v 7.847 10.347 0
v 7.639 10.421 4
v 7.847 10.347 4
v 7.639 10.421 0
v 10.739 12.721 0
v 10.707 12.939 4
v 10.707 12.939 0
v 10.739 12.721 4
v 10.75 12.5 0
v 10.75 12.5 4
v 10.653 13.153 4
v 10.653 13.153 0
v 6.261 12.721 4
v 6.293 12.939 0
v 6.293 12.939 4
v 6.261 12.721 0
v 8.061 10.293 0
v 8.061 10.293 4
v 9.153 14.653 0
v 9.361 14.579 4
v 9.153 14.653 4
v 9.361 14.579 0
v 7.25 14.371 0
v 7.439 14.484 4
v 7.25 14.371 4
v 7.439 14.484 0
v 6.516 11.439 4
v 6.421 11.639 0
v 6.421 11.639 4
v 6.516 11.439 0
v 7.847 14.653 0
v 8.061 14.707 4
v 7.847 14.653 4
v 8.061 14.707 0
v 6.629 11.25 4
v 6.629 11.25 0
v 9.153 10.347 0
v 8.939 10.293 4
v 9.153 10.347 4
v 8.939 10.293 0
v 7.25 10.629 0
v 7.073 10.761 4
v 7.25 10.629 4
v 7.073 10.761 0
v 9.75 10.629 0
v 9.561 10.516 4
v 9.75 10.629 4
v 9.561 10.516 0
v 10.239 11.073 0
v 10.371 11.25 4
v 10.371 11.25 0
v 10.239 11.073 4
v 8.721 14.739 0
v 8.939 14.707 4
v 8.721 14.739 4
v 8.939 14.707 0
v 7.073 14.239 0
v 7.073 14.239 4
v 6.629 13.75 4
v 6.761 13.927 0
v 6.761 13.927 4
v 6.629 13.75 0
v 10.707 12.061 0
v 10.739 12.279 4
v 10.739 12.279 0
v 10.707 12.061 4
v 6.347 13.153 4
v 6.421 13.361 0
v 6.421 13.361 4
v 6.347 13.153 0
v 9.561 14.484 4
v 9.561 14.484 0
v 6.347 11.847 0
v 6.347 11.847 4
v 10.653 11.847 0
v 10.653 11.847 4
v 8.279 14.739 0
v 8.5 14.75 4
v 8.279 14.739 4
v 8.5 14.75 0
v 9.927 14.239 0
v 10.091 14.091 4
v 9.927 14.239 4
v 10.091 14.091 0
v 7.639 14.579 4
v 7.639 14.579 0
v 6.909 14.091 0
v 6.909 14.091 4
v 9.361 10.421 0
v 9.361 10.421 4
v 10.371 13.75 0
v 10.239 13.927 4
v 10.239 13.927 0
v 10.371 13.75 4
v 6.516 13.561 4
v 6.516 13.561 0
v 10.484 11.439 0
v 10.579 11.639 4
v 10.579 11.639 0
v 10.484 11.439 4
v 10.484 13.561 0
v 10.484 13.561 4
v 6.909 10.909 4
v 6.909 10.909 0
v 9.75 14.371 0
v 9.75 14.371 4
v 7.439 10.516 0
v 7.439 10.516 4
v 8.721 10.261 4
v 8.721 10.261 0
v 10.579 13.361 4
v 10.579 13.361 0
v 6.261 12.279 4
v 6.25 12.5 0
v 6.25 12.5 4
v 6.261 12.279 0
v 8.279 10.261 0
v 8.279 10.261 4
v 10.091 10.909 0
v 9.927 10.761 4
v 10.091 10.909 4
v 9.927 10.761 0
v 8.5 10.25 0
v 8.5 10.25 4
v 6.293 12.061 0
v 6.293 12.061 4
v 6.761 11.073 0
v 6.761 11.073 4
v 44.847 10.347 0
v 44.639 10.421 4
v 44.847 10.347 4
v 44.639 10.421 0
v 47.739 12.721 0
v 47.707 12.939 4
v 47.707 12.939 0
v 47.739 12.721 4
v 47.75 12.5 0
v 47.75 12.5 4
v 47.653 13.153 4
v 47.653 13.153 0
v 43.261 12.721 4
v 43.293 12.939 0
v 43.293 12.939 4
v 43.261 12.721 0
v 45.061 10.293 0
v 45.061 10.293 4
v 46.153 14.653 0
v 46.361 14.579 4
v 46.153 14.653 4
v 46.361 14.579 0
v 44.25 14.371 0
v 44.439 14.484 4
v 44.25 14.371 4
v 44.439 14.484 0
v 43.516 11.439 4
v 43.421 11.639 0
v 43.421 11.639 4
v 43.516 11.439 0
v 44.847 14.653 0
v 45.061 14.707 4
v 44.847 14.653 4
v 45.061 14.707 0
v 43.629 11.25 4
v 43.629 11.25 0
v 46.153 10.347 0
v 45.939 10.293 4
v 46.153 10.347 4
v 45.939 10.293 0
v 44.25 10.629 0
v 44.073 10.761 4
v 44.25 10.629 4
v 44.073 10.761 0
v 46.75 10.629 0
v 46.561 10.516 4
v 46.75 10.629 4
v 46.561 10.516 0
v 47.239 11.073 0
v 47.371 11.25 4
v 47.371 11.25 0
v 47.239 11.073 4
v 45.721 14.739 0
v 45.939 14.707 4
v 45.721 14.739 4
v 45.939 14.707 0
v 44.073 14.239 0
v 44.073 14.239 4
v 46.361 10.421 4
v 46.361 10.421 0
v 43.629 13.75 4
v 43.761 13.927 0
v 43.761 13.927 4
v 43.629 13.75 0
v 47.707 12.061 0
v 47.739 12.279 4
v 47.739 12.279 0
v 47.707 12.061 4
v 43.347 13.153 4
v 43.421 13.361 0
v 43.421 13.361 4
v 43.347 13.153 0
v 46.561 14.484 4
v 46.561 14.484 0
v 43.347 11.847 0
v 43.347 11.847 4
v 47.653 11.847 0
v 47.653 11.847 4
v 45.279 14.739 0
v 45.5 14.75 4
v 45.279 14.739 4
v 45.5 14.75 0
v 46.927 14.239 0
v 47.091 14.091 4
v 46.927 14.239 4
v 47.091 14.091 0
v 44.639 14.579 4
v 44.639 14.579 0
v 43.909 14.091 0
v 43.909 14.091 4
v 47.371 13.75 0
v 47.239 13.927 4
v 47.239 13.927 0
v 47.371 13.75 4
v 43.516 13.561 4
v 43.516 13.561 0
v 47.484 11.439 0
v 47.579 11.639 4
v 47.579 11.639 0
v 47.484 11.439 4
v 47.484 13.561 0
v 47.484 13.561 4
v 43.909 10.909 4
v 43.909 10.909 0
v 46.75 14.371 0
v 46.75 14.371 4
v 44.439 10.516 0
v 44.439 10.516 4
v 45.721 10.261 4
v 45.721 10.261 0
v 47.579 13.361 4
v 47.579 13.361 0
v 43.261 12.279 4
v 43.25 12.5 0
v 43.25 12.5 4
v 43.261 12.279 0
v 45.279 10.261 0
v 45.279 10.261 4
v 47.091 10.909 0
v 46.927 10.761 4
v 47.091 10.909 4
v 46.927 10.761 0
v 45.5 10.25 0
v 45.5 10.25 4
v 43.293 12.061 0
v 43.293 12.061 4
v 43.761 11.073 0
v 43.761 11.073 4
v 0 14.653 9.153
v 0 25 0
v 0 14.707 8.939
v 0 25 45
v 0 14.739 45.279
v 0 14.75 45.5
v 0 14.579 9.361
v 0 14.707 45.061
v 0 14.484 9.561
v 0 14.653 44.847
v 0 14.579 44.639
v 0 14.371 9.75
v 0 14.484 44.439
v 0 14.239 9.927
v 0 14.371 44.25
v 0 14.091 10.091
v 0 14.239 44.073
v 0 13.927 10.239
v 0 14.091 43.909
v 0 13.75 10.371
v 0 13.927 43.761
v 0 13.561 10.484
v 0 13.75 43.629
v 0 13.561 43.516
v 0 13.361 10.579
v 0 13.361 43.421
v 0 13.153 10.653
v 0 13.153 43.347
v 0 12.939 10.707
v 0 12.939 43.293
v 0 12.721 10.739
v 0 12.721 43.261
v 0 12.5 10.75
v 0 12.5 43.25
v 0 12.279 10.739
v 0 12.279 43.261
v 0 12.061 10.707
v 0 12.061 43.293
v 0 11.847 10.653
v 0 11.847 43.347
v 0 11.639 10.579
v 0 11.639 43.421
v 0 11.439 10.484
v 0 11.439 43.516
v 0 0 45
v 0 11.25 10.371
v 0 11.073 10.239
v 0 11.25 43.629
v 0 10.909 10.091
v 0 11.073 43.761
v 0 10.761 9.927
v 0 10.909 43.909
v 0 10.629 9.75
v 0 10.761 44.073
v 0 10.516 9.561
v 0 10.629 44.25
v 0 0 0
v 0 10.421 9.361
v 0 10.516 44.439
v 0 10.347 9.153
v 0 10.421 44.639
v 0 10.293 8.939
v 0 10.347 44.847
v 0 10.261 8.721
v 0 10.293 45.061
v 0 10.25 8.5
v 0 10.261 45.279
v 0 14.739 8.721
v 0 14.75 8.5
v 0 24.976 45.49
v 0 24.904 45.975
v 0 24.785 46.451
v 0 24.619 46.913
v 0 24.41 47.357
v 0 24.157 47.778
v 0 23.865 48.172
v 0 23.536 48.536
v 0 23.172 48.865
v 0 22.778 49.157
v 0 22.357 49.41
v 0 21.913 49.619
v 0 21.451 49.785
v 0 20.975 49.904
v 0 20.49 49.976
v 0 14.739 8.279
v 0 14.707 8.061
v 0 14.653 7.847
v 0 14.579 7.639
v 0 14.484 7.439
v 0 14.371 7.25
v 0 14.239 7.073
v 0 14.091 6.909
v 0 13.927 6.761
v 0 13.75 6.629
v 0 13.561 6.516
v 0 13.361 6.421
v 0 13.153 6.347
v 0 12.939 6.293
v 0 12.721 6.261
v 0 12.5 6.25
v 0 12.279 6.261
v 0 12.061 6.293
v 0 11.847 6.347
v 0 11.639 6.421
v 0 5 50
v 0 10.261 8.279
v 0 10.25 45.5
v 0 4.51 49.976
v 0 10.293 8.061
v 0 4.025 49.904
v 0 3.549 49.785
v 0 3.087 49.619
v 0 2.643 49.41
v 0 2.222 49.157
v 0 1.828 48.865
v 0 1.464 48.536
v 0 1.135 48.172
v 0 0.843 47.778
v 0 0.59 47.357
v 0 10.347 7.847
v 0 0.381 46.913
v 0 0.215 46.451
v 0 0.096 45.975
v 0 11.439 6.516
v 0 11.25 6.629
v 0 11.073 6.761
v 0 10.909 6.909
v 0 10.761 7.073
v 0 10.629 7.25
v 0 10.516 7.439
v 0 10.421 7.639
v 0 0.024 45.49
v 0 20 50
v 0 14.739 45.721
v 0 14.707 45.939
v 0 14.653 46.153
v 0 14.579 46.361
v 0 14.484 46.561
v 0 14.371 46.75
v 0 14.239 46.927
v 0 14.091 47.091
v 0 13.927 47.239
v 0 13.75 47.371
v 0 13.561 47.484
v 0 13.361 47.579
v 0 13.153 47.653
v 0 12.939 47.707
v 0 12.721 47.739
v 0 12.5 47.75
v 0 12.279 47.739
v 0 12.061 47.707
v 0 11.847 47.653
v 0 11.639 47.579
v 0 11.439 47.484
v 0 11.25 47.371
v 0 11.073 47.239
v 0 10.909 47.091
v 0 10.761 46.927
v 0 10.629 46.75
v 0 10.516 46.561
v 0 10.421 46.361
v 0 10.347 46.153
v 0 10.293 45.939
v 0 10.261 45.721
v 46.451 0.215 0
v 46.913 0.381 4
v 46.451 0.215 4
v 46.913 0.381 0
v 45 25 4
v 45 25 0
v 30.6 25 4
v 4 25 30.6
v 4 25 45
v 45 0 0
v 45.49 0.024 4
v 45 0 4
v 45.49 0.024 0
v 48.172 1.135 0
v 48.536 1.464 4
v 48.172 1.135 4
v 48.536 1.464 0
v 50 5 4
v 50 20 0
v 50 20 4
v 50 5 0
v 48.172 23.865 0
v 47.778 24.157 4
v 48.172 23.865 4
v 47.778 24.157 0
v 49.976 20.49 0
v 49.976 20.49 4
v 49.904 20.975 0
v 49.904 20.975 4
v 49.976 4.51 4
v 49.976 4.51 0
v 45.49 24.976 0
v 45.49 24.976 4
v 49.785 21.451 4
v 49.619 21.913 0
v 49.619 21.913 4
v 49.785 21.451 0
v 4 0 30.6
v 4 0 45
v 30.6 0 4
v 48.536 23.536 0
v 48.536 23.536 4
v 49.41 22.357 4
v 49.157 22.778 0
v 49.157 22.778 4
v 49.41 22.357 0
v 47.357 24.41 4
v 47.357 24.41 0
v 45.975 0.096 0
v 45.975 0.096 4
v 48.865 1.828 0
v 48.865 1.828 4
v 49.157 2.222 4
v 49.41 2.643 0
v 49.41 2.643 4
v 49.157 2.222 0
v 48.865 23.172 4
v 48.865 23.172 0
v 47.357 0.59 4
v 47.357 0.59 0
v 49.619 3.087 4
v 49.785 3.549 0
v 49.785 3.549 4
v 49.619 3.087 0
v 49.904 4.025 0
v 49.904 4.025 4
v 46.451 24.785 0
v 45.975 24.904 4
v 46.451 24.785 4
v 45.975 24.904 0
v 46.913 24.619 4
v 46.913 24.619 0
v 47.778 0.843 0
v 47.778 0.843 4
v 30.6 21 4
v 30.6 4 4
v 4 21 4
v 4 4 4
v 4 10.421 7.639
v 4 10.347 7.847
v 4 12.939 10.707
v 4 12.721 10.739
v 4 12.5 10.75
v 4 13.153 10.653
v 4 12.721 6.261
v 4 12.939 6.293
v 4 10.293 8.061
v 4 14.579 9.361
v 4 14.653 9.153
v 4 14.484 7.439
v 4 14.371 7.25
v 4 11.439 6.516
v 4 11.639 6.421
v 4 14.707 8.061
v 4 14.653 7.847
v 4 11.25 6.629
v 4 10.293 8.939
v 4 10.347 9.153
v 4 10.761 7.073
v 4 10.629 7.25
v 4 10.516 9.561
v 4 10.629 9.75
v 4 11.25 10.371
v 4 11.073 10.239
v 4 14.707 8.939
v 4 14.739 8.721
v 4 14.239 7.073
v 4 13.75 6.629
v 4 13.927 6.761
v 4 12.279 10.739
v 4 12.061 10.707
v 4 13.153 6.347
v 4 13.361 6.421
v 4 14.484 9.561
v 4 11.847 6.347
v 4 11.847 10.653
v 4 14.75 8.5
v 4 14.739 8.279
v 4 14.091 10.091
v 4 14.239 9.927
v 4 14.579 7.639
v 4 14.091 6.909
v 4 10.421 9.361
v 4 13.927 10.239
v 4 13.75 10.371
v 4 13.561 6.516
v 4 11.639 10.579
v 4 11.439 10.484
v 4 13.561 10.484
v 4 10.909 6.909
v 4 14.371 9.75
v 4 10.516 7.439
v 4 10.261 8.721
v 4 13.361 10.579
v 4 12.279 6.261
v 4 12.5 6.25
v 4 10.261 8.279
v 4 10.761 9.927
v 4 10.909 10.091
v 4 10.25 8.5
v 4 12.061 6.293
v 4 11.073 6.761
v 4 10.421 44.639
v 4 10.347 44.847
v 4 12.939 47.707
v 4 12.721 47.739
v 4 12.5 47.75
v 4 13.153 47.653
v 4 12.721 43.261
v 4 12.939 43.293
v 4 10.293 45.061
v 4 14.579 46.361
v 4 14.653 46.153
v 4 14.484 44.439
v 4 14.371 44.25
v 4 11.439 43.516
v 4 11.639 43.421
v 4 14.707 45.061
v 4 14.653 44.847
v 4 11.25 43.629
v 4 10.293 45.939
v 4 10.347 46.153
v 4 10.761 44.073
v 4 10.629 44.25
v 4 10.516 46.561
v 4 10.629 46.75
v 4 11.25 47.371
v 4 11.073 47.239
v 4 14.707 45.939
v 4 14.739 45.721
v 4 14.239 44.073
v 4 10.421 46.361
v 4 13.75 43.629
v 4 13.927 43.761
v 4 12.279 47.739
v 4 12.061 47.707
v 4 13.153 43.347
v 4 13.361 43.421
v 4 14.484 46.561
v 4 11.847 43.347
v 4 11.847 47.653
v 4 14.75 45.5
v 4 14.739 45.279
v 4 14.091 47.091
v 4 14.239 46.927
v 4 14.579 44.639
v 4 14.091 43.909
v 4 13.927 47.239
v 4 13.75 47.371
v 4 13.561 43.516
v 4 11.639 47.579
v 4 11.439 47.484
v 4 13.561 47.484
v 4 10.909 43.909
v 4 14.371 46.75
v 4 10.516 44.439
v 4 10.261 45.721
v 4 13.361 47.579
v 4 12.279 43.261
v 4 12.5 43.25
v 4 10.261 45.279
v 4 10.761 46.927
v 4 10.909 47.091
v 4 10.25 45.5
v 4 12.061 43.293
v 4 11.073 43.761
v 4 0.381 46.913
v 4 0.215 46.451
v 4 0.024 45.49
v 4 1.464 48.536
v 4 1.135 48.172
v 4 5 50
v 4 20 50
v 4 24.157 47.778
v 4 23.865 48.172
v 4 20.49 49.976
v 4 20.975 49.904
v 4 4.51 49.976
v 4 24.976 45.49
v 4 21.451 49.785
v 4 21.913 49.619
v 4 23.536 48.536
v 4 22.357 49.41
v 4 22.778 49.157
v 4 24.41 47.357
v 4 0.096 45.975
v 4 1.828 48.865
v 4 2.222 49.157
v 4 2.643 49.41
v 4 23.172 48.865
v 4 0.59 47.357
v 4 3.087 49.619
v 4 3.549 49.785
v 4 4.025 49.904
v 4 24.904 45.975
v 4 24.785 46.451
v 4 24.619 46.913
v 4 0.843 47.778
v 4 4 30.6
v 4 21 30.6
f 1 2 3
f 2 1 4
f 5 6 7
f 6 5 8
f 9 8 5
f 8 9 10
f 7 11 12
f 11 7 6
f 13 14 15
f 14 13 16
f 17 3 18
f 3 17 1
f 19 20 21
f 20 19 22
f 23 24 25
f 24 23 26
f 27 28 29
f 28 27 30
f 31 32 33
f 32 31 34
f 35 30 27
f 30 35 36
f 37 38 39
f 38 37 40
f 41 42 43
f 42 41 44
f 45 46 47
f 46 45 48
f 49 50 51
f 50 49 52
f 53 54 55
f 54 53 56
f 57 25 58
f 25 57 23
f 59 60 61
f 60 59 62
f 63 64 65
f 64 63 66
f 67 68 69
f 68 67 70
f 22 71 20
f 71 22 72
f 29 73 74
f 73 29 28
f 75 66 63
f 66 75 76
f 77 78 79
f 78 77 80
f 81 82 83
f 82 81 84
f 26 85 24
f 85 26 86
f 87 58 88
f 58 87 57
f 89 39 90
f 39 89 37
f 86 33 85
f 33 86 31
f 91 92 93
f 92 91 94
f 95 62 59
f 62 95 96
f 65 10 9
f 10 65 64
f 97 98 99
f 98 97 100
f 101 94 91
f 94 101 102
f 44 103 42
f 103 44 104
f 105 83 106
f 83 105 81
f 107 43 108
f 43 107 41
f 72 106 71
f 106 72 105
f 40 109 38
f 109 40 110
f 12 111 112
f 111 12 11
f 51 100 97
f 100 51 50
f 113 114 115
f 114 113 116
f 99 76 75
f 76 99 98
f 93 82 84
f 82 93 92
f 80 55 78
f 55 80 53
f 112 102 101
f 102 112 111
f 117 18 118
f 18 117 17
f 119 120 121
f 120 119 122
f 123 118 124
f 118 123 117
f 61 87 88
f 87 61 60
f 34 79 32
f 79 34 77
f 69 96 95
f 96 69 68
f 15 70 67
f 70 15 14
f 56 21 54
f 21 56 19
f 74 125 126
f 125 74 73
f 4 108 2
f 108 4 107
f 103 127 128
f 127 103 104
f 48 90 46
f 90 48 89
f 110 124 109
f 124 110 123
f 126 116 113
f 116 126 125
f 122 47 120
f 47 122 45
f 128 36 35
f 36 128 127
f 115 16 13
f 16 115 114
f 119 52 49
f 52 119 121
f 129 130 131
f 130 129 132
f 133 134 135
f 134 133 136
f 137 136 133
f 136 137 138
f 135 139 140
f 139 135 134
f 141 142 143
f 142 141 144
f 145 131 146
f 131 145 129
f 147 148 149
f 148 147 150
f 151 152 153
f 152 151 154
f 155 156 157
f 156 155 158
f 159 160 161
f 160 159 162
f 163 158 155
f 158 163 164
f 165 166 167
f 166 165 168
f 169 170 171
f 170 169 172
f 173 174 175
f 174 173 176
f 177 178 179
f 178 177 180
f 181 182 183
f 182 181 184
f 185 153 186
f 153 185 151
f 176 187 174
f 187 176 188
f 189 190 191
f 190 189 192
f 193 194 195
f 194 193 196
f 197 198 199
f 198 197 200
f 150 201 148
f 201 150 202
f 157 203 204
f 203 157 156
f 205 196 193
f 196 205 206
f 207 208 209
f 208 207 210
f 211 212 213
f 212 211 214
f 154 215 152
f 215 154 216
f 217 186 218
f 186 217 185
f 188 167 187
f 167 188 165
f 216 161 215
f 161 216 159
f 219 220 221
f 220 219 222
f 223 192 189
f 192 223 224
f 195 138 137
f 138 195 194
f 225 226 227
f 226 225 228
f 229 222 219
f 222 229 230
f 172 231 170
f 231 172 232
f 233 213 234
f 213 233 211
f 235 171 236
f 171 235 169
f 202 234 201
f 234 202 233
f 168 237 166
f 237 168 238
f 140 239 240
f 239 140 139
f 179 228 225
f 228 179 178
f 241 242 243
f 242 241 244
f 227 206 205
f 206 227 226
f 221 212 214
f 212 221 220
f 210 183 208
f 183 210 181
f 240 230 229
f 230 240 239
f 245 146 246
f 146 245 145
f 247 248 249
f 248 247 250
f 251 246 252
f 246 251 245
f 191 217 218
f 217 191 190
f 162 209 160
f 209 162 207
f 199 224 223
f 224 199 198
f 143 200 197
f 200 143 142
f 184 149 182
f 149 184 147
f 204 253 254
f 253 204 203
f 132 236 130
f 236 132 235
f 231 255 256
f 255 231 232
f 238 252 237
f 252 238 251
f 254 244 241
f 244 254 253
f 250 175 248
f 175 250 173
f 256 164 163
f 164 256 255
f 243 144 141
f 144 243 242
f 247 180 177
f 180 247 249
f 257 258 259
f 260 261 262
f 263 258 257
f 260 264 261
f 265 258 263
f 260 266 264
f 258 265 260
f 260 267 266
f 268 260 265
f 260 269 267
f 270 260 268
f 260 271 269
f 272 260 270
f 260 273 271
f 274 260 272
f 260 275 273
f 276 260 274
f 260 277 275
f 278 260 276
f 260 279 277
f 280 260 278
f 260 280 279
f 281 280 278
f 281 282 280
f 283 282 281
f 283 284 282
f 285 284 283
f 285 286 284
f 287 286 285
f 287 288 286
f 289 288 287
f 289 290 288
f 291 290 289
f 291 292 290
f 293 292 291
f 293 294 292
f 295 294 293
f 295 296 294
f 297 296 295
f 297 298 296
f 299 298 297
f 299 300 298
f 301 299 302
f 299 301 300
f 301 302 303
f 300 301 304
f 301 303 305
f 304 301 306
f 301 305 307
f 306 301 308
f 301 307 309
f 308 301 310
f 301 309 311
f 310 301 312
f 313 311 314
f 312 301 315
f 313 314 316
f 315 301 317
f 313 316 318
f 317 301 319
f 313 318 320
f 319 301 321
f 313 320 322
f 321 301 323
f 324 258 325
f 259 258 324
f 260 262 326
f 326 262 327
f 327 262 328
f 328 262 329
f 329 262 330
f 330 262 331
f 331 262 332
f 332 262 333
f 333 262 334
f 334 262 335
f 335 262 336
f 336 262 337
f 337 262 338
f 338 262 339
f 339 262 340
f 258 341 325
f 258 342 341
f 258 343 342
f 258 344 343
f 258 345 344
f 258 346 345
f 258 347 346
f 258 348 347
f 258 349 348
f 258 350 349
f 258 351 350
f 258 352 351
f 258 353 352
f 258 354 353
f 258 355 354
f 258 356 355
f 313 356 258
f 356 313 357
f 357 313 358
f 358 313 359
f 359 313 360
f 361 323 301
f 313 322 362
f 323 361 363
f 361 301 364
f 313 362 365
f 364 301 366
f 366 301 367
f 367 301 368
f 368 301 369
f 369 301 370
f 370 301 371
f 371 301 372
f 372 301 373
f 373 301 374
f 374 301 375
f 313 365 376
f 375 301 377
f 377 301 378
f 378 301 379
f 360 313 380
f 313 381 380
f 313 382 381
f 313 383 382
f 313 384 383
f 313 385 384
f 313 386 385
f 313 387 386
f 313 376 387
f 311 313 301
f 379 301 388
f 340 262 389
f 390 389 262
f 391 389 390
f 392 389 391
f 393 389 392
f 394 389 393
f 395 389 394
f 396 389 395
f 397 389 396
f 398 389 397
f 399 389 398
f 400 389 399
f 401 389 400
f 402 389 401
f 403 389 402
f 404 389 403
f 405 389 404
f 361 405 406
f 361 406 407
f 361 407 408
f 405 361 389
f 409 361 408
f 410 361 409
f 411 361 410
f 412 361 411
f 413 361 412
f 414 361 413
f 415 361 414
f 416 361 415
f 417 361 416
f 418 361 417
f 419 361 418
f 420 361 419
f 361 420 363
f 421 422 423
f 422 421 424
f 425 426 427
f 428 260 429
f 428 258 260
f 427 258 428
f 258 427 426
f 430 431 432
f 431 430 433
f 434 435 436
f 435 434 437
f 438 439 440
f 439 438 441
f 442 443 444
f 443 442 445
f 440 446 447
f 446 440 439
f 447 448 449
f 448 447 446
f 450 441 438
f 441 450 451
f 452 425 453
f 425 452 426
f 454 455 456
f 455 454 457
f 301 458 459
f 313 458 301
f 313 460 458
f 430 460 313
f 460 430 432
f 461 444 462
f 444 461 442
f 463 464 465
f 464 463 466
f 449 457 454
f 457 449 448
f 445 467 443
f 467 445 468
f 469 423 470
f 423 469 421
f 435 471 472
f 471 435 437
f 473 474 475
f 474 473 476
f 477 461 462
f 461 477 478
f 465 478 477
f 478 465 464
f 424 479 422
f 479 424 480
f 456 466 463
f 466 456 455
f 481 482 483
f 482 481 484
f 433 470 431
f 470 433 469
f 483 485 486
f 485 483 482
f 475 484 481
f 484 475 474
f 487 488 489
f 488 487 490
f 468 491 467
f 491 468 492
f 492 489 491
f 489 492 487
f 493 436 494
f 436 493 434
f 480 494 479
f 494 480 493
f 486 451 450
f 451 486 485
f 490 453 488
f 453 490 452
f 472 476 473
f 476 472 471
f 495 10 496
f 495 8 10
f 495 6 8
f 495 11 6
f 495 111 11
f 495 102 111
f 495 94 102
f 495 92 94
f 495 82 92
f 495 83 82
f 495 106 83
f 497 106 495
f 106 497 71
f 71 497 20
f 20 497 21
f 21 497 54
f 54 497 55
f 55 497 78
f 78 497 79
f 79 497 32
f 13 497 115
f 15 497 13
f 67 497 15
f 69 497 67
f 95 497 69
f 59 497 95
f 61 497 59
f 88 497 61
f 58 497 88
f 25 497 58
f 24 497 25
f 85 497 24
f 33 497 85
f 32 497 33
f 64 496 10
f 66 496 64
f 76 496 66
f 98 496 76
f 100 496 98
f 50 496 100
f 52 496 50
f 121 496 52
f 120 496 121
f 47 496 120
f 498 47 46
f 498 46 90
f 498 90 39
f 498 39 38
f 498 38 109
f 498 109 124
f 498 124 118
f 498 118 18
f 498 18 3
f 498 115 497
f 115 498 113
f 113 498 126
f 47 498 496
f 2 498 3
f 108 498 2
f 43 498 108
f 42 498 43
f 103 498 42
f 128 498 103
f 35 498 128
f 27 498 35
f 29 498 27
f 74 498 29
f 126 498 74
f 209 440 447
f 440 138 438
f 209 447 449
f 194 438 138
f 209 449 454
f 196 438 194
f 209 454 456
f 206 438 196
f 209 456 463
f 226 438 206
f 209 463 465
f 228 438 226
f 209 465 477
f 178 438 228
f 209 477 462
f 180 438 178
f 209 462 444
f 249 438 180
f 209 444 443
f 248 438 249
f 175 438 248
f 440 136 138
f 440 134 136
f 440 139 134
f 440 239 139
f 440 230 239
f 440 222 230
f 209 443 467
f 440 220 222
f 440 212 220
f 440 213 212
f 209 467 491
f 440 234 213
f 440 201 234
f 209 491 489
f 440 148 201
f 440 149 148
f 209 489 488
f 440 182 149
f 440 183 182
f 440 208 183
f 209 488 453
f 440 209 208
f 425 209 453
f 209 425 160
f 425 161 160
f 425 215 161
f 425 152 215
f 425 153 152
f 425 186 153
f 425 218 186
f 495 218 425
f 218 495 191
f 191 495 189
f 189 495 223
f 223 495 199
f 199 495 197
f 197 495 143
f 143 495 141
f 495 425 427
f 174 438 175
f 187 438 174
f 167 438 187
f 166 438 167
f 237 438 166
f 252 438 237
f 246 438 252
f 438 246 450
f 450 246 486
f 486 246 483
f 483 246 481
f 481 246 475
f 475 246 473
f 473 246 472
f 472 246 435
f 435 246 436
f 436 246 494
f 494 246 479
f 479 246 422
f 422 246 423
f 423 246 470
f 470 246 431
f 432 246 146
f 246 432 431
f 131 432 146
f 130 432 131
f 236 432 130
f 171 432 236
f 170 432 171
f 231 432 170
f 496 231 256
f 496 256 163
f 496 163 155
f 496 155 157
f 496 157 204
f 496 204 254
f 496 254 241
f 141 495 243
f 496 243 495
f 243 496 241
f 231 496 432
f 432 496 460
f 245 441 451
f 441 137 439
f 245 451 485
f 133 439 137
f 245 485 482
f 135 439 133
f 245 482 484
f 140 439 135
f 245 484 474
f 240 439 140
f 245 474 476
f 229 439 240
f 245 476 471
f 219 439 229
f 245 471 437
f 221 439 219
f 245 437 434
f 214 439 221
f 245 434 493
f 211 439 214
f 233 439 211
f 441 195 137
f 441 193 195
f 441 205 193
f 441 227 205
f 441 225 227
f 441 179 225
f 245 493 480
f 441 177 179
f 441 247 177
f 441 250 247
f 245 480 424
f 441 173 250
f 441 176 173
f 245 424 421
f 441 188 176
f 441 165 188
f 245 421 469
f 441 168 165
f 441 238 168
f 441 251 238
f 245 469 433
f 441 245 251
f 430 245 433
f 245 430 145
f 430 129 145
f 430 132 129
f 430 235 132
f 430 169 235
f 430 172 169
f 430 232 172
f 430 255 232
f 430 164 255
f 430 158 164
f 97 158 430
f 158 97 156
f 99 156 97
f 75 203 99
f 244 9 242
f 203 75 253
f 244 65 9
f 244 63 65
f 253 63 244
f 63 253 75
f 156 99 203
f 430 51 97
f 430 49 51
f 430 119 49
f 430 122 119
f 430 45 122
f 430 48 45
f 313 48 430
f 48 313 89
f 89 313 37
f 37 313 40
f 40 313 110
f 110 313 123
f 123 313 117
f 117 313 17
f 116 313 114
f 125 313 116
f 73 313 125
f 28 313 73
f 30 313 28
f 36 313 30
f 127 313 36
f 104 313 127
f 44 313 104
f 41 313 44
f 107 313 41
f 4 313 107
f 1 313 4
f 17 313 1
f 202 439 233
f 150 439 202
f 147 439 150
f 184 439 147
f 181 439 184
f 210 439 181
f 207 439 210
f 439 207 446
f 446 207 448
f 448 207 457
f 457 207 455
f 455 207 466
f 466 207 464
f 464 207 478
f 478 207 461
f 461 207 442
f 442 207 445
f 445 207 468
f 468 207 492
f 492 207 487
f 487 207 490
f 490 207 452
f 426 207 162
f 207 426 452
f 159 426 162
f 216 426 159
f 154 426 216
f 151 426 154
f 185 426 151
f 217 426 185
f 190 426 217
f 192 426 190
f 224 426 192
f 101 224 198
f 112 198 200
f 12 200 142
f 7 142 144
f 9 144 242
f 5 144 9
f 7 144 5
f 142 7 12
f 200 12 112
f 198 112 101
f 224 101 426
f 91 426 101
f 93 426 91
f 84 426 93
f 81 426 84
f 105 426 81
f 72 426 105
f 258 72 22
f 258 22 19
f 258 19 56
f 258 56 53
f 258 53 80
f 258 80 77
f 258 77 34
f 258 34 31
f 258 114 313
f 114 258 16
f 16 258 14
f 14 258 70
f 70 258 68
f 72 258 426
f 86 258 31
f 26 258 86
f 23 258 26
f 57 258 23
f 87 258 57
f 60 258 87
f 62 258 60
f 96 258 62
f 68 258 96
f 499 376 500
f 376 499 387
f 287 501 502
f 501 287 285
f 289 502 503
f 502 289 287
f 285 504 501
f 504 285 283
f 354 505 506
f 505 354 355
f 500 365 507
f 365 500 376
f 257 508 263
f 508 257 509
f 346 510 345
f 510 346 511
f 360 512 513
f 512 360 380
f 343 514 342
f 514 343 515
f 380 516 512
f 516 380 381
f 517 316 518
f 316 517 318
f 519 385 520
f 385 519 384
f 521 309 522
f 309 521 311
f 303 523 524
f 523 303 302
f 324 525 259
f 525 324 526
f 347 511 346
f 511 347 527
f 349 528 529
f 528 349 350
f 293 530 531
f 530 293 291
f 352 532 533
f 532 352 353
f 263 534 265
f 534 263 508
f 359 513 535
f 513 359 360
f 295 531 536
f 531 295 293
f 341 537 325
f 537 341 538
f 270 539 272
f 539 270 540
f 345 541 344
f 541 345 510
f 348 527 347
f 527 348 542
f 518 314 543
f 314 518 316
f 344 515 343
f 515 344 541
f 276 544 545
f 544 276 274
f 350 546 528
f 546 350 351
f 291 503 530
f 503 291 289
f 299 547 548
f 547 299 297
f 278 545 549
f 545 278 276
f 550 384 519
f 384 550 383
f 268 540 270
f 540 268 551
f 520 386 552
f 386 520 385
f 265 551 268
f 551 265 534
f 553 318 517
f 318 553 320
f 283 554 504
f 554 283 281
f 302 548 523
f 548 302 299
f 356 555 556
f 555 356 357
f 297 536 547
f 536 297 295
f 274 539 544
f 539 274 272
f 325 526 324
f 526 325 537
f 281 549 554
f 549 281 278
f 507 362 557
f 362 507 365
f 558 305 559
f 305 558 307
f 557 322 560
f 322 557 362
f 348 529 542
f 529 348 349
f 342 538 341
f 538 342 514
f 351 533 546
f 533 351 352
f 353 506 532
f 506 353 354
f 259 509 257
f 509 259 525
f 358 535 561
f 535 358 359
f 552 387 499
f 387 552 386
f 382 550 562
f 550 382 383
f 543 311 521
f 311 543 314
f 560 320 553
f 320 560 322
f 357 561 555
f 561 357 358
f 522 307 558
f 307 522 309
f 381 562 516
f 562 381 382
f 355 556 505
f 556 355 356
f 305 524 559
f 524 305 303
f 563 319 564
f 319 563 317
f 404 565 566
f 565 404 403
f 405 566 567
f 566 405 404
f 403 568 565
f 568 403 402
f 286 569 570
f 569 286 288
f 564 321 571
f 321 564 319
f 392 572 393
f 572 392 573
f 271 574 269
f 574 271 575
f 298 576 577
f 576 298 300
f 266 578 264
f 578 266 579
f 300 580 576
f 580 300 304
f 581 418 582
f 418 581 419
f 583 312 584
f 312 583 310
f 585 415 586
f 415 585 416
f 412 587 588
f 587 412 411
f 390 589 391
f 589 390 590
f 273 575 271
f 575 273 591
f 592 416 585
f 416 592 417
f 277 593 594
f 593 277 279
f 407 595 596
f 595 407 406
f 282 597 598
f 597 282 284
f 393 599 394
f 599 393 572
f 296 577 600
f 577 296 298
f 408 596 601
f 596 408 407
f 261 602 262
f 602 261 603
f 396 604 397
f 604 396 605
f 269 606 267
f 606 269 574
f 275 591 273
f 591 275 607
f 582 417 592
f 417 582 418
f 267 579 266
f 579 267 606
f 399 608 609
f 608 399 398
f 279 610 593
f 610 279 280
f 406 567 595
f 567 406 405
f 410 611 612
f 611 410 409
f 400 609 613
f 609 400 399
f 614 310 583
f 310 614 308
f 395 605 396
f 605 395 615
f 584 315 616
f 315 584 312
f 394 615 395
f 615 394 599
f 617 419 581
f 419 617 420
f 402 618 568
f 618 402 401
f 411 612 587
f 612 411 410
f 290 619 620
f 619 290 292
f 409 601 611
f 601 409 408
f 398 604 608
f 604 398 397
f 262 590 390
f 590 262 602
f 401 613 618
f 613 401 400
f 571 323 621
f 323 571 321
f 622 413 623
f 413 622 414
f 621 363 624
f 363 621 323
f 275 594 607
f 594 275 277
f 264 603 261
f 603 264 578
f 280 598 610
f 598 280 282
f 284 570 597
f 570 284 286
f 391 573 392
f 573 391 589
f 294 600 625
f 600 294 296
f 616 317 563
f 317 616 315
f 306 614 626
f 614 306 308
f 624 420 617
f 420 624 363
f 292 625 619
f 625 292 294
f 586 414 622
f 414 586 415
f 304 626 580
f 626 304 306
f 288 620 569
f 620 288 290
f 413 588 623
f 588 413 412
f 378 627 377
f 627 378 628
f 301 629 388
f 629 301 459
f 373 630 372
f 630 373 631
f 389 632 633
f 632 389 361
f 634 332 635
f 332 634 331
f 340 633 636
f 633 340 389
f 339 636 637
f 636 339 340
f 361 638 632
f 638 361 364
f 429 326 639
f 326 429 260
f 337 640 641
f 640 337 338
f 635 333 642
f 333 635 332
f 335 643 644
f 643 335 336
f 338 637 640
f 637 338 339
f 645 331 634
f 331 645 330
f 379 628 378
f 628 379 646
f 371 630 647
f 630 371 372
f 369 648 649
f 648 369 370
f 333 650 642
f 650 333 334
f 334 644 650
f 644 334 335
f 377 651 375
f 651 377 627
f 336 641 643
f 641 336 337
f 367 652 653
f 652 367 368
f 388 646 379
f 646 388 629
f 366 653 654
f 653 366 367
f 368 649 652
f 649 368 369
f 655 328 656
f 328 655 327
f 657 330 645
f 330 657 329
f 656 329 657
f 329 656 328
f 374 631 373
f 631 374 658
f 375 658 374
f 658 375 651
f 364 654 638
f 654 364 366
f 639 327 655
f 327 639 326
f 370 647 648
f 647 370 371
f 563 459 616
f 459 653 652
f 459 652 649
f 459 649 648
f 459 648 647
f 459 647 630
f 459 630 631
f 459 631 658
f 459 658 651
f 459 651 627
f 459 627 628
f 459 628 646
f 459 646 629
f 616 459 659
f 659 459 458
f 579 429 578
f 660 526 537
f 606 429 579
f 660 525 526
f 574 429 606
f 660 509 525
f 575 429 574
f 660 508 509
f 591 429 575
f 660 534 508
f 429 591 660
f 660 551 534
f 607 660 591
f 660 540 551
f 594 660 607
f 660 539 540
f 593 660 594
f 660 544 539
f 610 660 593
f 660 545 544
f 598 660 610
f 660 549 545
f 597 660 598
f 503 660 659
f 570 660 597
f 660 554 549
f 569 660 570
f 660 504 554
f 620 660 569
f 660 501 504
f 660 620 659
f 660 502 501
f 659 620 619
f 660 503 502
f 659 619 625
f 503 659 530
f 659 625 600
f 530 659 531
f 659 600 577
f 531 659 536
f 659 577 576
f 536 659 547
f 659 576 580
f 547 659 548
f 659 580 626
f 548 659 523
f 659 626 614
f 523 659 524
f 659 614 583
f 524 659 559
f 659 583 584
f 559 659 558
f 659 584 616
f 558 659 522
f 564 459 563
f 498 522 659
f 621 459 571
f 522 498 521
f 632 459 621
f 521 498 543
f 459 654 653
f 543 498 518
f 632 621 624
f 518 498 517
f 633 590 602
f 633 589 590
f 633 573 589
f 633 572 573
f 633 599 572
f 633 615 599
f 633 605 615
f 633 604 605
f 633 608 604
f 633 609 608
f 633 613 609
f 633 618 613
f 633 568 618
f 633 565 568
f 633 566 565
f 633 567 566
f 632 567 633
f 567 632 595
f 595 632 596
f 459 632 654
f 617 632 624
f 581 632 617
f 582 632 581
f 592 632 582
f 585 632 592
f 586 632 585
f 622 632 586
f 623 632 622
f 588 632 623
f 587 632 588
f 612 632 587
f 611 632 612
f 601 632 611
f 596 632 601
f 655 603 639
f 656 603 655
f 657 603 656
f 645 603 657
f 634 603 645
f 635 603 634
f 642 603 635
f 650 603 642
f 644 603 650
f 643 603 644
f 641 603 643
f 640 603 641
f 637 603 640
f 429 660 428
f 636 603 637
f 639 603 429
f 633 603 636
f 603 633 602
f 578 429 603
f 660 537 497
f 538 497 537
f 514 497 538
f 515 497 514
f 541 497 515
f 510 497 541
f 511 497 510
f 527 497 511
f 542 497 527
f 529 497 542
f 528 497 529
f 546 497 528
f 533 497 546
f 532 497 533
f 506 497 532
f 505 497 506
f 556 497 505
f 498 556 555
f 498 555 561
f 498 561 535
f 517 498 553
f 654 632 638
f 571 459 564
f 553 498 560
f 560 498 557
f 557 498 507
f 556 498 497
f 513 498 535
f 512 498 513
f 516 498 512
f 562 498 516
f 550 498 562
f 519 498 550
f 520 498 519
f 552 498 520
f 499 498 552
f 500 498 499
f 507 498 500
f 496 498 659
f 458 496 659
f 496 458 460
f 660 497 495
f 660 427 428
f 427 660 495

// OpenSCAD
// Кронштейн / уголок (B22). Параметры ниже переопределяет сервер: openscad -D length_a=50 ...
// Все размеры в мм. Полка A лежит на столе (вдоль X), полка B стоит вертикально (вдоль Z),
// наружный угол — в начале координат. Ширина — по Y.

length_a = 50;          // длина горизонтальной полки A
length_b = 50;          // длина вертикальной полки B
width = 25;             // ширина уголка
thickness = 4;          // толщина полок
hole_d = 4.5;           // диаметр отверстий
holes_a = 2;            // отверстий в полке A (0..4)
holes_b = 2;            // отверстий в полке B (0..4)
hole_type = "plain";    // "plain" | "countersunk" (потай с внутренней стороны)
rib = true;             // косынки по бокам
rounded = true;         // скруглить свободные концы полок

$fn = 64;               // гладкость окружностей
eps = 0.01;             // небольшой запас, чтобы вырезы выходили за край детали

// --- отверстия ---------------------------------------------------------------------------
// Ряд по середине ширины. От свободного конца и от внутреннего угла отступаем на диаметр,
// между центрами — не меньше двух диаметров. Если столько отверстий не помещается,
// лишние пропускаем (подсказка в форме об этом предупреждает).
function hole_span(len) = len - thickness - 2 * hole_d;
function holes_fit(len, n) =
    n <= 0 ? 0
    : len - thickness < 1.5 * hole_d ? 0              // даже одно не влезает
    : n == 1 || hole_span(len) < 2 * hole_d ? 1       // место только для одного
    : min(n, floor(hole_span(len) / (2 * hole_d)) + 1);
// Координата i-го центра вдоль полки (отсчёт от наружного угла).
function hole_pos(len, n, i) =
    n == 1 ? thickness + (len - thickness) / 2
    : thickness + hole_d + i * hole_span(len) / (n - 1);

// Глубина потая: конус 90° (ширина головки = 2 диаметра), но не глубже 60% толщины,
// чтобы под головкой осталась опора.
sink_h = hole_type == "countersunk" ? min(hole_d / 2, thickness * 0.6) : 0;

// Одно отверстие вдоль Z, ось в начале координат, от z = -eps до thickness + eps.
// Потай — у верхней (внутренней) кромки.
module hole() {
    translate([0, 0, -eps]) cylinder(d = hole_d, h = thickness + 2 * eps);
    if (sink_h > 0)
        translate([0, 0, thickness - sink_h])
            cylinder(d1 = hole_d, d2 = hole_d + 2 * sink_h, h = sink_h + eps);
}

// --- полки -------------------------------------------------------------------------------
// Полка в плоскости XY: прямоугольник length × width × thickness, свободный конец
// (x = length) при rounded — со скруглёнными углами.
module leg_flat(len) {
    r = rounded ? min(5, width / 3, (len - thickness) / 2) : 0;
    if (r > 0) {
        hull() {
            cube([len - r, width, thickness]);
            translate([len - r, r, 0]) cylinder(r = r, h = thickness);
            translate([len - r, width - r, 0]) cylinder(r = r, h = thickness);
        }
    } else {
        cube([len, width, thickness]);
    }
}

// Полка с рядом отверстий (та же система координат, что у leg_flat).
module leg(len, n) {
    k = holes_fit(len, n);
    difference() {
        leg_flat(len);
        for (i = [0 : 1 : k - 1])
            translate([hole_pos(len, k, i), width / 2, 0]) hole();
    }
}

// --- косынки -----------------------------------------------------------------------------
// Треугольники в плоскости XZ во внутреннем углу, по одному у каждого бока.
// Толщина ребра — как у полок, но ребра не должны залезать на ряд отверстий:
// между ними оставляем hole_d + 2 мм. Длина катетов — 60% короткой полки.
rib_t = min(thickness, (width - hole_d - 2) / 2);
rib_len = 0.6 * (min(length_a, length_b) - thickness);

module gusset() {
    // Вершина чуть утоплена в угол, чтобы ребро срослось с полками без щели.
    t = thickness;
    rotate([90, 0, 0])
        linear_extrude(rib_t)
            polygon([[t - 1, t - 1], [t + rib_len, t - 1], [t - 1, t + rib_len]]);
}

module gussets() {
    if (rib && rib_t >= 1 && rib_len >= 3) {
        translate([0, rib_t, 0]) gusset();         // у бока y = 0
        translate([0, width, 0]) gusset();         // у бока y = width
    }
}

// --- сборка ------------------------------------------------------------------------------
union() {
    leg(length_a, holes_a);                                  // полка A — на столе
    // Полка B: та же заготовка, но стоя. mirror([1,0,-1]) меняет местами X и Z:
    // длина уходит вверх, толщина ложится на x от 0 до thickness, потай остаётся
    // с внутренней стороны (x = thickness).
    mirror([1, 0, -1]) leg(length_b, holes_b);
    gussets();
}
